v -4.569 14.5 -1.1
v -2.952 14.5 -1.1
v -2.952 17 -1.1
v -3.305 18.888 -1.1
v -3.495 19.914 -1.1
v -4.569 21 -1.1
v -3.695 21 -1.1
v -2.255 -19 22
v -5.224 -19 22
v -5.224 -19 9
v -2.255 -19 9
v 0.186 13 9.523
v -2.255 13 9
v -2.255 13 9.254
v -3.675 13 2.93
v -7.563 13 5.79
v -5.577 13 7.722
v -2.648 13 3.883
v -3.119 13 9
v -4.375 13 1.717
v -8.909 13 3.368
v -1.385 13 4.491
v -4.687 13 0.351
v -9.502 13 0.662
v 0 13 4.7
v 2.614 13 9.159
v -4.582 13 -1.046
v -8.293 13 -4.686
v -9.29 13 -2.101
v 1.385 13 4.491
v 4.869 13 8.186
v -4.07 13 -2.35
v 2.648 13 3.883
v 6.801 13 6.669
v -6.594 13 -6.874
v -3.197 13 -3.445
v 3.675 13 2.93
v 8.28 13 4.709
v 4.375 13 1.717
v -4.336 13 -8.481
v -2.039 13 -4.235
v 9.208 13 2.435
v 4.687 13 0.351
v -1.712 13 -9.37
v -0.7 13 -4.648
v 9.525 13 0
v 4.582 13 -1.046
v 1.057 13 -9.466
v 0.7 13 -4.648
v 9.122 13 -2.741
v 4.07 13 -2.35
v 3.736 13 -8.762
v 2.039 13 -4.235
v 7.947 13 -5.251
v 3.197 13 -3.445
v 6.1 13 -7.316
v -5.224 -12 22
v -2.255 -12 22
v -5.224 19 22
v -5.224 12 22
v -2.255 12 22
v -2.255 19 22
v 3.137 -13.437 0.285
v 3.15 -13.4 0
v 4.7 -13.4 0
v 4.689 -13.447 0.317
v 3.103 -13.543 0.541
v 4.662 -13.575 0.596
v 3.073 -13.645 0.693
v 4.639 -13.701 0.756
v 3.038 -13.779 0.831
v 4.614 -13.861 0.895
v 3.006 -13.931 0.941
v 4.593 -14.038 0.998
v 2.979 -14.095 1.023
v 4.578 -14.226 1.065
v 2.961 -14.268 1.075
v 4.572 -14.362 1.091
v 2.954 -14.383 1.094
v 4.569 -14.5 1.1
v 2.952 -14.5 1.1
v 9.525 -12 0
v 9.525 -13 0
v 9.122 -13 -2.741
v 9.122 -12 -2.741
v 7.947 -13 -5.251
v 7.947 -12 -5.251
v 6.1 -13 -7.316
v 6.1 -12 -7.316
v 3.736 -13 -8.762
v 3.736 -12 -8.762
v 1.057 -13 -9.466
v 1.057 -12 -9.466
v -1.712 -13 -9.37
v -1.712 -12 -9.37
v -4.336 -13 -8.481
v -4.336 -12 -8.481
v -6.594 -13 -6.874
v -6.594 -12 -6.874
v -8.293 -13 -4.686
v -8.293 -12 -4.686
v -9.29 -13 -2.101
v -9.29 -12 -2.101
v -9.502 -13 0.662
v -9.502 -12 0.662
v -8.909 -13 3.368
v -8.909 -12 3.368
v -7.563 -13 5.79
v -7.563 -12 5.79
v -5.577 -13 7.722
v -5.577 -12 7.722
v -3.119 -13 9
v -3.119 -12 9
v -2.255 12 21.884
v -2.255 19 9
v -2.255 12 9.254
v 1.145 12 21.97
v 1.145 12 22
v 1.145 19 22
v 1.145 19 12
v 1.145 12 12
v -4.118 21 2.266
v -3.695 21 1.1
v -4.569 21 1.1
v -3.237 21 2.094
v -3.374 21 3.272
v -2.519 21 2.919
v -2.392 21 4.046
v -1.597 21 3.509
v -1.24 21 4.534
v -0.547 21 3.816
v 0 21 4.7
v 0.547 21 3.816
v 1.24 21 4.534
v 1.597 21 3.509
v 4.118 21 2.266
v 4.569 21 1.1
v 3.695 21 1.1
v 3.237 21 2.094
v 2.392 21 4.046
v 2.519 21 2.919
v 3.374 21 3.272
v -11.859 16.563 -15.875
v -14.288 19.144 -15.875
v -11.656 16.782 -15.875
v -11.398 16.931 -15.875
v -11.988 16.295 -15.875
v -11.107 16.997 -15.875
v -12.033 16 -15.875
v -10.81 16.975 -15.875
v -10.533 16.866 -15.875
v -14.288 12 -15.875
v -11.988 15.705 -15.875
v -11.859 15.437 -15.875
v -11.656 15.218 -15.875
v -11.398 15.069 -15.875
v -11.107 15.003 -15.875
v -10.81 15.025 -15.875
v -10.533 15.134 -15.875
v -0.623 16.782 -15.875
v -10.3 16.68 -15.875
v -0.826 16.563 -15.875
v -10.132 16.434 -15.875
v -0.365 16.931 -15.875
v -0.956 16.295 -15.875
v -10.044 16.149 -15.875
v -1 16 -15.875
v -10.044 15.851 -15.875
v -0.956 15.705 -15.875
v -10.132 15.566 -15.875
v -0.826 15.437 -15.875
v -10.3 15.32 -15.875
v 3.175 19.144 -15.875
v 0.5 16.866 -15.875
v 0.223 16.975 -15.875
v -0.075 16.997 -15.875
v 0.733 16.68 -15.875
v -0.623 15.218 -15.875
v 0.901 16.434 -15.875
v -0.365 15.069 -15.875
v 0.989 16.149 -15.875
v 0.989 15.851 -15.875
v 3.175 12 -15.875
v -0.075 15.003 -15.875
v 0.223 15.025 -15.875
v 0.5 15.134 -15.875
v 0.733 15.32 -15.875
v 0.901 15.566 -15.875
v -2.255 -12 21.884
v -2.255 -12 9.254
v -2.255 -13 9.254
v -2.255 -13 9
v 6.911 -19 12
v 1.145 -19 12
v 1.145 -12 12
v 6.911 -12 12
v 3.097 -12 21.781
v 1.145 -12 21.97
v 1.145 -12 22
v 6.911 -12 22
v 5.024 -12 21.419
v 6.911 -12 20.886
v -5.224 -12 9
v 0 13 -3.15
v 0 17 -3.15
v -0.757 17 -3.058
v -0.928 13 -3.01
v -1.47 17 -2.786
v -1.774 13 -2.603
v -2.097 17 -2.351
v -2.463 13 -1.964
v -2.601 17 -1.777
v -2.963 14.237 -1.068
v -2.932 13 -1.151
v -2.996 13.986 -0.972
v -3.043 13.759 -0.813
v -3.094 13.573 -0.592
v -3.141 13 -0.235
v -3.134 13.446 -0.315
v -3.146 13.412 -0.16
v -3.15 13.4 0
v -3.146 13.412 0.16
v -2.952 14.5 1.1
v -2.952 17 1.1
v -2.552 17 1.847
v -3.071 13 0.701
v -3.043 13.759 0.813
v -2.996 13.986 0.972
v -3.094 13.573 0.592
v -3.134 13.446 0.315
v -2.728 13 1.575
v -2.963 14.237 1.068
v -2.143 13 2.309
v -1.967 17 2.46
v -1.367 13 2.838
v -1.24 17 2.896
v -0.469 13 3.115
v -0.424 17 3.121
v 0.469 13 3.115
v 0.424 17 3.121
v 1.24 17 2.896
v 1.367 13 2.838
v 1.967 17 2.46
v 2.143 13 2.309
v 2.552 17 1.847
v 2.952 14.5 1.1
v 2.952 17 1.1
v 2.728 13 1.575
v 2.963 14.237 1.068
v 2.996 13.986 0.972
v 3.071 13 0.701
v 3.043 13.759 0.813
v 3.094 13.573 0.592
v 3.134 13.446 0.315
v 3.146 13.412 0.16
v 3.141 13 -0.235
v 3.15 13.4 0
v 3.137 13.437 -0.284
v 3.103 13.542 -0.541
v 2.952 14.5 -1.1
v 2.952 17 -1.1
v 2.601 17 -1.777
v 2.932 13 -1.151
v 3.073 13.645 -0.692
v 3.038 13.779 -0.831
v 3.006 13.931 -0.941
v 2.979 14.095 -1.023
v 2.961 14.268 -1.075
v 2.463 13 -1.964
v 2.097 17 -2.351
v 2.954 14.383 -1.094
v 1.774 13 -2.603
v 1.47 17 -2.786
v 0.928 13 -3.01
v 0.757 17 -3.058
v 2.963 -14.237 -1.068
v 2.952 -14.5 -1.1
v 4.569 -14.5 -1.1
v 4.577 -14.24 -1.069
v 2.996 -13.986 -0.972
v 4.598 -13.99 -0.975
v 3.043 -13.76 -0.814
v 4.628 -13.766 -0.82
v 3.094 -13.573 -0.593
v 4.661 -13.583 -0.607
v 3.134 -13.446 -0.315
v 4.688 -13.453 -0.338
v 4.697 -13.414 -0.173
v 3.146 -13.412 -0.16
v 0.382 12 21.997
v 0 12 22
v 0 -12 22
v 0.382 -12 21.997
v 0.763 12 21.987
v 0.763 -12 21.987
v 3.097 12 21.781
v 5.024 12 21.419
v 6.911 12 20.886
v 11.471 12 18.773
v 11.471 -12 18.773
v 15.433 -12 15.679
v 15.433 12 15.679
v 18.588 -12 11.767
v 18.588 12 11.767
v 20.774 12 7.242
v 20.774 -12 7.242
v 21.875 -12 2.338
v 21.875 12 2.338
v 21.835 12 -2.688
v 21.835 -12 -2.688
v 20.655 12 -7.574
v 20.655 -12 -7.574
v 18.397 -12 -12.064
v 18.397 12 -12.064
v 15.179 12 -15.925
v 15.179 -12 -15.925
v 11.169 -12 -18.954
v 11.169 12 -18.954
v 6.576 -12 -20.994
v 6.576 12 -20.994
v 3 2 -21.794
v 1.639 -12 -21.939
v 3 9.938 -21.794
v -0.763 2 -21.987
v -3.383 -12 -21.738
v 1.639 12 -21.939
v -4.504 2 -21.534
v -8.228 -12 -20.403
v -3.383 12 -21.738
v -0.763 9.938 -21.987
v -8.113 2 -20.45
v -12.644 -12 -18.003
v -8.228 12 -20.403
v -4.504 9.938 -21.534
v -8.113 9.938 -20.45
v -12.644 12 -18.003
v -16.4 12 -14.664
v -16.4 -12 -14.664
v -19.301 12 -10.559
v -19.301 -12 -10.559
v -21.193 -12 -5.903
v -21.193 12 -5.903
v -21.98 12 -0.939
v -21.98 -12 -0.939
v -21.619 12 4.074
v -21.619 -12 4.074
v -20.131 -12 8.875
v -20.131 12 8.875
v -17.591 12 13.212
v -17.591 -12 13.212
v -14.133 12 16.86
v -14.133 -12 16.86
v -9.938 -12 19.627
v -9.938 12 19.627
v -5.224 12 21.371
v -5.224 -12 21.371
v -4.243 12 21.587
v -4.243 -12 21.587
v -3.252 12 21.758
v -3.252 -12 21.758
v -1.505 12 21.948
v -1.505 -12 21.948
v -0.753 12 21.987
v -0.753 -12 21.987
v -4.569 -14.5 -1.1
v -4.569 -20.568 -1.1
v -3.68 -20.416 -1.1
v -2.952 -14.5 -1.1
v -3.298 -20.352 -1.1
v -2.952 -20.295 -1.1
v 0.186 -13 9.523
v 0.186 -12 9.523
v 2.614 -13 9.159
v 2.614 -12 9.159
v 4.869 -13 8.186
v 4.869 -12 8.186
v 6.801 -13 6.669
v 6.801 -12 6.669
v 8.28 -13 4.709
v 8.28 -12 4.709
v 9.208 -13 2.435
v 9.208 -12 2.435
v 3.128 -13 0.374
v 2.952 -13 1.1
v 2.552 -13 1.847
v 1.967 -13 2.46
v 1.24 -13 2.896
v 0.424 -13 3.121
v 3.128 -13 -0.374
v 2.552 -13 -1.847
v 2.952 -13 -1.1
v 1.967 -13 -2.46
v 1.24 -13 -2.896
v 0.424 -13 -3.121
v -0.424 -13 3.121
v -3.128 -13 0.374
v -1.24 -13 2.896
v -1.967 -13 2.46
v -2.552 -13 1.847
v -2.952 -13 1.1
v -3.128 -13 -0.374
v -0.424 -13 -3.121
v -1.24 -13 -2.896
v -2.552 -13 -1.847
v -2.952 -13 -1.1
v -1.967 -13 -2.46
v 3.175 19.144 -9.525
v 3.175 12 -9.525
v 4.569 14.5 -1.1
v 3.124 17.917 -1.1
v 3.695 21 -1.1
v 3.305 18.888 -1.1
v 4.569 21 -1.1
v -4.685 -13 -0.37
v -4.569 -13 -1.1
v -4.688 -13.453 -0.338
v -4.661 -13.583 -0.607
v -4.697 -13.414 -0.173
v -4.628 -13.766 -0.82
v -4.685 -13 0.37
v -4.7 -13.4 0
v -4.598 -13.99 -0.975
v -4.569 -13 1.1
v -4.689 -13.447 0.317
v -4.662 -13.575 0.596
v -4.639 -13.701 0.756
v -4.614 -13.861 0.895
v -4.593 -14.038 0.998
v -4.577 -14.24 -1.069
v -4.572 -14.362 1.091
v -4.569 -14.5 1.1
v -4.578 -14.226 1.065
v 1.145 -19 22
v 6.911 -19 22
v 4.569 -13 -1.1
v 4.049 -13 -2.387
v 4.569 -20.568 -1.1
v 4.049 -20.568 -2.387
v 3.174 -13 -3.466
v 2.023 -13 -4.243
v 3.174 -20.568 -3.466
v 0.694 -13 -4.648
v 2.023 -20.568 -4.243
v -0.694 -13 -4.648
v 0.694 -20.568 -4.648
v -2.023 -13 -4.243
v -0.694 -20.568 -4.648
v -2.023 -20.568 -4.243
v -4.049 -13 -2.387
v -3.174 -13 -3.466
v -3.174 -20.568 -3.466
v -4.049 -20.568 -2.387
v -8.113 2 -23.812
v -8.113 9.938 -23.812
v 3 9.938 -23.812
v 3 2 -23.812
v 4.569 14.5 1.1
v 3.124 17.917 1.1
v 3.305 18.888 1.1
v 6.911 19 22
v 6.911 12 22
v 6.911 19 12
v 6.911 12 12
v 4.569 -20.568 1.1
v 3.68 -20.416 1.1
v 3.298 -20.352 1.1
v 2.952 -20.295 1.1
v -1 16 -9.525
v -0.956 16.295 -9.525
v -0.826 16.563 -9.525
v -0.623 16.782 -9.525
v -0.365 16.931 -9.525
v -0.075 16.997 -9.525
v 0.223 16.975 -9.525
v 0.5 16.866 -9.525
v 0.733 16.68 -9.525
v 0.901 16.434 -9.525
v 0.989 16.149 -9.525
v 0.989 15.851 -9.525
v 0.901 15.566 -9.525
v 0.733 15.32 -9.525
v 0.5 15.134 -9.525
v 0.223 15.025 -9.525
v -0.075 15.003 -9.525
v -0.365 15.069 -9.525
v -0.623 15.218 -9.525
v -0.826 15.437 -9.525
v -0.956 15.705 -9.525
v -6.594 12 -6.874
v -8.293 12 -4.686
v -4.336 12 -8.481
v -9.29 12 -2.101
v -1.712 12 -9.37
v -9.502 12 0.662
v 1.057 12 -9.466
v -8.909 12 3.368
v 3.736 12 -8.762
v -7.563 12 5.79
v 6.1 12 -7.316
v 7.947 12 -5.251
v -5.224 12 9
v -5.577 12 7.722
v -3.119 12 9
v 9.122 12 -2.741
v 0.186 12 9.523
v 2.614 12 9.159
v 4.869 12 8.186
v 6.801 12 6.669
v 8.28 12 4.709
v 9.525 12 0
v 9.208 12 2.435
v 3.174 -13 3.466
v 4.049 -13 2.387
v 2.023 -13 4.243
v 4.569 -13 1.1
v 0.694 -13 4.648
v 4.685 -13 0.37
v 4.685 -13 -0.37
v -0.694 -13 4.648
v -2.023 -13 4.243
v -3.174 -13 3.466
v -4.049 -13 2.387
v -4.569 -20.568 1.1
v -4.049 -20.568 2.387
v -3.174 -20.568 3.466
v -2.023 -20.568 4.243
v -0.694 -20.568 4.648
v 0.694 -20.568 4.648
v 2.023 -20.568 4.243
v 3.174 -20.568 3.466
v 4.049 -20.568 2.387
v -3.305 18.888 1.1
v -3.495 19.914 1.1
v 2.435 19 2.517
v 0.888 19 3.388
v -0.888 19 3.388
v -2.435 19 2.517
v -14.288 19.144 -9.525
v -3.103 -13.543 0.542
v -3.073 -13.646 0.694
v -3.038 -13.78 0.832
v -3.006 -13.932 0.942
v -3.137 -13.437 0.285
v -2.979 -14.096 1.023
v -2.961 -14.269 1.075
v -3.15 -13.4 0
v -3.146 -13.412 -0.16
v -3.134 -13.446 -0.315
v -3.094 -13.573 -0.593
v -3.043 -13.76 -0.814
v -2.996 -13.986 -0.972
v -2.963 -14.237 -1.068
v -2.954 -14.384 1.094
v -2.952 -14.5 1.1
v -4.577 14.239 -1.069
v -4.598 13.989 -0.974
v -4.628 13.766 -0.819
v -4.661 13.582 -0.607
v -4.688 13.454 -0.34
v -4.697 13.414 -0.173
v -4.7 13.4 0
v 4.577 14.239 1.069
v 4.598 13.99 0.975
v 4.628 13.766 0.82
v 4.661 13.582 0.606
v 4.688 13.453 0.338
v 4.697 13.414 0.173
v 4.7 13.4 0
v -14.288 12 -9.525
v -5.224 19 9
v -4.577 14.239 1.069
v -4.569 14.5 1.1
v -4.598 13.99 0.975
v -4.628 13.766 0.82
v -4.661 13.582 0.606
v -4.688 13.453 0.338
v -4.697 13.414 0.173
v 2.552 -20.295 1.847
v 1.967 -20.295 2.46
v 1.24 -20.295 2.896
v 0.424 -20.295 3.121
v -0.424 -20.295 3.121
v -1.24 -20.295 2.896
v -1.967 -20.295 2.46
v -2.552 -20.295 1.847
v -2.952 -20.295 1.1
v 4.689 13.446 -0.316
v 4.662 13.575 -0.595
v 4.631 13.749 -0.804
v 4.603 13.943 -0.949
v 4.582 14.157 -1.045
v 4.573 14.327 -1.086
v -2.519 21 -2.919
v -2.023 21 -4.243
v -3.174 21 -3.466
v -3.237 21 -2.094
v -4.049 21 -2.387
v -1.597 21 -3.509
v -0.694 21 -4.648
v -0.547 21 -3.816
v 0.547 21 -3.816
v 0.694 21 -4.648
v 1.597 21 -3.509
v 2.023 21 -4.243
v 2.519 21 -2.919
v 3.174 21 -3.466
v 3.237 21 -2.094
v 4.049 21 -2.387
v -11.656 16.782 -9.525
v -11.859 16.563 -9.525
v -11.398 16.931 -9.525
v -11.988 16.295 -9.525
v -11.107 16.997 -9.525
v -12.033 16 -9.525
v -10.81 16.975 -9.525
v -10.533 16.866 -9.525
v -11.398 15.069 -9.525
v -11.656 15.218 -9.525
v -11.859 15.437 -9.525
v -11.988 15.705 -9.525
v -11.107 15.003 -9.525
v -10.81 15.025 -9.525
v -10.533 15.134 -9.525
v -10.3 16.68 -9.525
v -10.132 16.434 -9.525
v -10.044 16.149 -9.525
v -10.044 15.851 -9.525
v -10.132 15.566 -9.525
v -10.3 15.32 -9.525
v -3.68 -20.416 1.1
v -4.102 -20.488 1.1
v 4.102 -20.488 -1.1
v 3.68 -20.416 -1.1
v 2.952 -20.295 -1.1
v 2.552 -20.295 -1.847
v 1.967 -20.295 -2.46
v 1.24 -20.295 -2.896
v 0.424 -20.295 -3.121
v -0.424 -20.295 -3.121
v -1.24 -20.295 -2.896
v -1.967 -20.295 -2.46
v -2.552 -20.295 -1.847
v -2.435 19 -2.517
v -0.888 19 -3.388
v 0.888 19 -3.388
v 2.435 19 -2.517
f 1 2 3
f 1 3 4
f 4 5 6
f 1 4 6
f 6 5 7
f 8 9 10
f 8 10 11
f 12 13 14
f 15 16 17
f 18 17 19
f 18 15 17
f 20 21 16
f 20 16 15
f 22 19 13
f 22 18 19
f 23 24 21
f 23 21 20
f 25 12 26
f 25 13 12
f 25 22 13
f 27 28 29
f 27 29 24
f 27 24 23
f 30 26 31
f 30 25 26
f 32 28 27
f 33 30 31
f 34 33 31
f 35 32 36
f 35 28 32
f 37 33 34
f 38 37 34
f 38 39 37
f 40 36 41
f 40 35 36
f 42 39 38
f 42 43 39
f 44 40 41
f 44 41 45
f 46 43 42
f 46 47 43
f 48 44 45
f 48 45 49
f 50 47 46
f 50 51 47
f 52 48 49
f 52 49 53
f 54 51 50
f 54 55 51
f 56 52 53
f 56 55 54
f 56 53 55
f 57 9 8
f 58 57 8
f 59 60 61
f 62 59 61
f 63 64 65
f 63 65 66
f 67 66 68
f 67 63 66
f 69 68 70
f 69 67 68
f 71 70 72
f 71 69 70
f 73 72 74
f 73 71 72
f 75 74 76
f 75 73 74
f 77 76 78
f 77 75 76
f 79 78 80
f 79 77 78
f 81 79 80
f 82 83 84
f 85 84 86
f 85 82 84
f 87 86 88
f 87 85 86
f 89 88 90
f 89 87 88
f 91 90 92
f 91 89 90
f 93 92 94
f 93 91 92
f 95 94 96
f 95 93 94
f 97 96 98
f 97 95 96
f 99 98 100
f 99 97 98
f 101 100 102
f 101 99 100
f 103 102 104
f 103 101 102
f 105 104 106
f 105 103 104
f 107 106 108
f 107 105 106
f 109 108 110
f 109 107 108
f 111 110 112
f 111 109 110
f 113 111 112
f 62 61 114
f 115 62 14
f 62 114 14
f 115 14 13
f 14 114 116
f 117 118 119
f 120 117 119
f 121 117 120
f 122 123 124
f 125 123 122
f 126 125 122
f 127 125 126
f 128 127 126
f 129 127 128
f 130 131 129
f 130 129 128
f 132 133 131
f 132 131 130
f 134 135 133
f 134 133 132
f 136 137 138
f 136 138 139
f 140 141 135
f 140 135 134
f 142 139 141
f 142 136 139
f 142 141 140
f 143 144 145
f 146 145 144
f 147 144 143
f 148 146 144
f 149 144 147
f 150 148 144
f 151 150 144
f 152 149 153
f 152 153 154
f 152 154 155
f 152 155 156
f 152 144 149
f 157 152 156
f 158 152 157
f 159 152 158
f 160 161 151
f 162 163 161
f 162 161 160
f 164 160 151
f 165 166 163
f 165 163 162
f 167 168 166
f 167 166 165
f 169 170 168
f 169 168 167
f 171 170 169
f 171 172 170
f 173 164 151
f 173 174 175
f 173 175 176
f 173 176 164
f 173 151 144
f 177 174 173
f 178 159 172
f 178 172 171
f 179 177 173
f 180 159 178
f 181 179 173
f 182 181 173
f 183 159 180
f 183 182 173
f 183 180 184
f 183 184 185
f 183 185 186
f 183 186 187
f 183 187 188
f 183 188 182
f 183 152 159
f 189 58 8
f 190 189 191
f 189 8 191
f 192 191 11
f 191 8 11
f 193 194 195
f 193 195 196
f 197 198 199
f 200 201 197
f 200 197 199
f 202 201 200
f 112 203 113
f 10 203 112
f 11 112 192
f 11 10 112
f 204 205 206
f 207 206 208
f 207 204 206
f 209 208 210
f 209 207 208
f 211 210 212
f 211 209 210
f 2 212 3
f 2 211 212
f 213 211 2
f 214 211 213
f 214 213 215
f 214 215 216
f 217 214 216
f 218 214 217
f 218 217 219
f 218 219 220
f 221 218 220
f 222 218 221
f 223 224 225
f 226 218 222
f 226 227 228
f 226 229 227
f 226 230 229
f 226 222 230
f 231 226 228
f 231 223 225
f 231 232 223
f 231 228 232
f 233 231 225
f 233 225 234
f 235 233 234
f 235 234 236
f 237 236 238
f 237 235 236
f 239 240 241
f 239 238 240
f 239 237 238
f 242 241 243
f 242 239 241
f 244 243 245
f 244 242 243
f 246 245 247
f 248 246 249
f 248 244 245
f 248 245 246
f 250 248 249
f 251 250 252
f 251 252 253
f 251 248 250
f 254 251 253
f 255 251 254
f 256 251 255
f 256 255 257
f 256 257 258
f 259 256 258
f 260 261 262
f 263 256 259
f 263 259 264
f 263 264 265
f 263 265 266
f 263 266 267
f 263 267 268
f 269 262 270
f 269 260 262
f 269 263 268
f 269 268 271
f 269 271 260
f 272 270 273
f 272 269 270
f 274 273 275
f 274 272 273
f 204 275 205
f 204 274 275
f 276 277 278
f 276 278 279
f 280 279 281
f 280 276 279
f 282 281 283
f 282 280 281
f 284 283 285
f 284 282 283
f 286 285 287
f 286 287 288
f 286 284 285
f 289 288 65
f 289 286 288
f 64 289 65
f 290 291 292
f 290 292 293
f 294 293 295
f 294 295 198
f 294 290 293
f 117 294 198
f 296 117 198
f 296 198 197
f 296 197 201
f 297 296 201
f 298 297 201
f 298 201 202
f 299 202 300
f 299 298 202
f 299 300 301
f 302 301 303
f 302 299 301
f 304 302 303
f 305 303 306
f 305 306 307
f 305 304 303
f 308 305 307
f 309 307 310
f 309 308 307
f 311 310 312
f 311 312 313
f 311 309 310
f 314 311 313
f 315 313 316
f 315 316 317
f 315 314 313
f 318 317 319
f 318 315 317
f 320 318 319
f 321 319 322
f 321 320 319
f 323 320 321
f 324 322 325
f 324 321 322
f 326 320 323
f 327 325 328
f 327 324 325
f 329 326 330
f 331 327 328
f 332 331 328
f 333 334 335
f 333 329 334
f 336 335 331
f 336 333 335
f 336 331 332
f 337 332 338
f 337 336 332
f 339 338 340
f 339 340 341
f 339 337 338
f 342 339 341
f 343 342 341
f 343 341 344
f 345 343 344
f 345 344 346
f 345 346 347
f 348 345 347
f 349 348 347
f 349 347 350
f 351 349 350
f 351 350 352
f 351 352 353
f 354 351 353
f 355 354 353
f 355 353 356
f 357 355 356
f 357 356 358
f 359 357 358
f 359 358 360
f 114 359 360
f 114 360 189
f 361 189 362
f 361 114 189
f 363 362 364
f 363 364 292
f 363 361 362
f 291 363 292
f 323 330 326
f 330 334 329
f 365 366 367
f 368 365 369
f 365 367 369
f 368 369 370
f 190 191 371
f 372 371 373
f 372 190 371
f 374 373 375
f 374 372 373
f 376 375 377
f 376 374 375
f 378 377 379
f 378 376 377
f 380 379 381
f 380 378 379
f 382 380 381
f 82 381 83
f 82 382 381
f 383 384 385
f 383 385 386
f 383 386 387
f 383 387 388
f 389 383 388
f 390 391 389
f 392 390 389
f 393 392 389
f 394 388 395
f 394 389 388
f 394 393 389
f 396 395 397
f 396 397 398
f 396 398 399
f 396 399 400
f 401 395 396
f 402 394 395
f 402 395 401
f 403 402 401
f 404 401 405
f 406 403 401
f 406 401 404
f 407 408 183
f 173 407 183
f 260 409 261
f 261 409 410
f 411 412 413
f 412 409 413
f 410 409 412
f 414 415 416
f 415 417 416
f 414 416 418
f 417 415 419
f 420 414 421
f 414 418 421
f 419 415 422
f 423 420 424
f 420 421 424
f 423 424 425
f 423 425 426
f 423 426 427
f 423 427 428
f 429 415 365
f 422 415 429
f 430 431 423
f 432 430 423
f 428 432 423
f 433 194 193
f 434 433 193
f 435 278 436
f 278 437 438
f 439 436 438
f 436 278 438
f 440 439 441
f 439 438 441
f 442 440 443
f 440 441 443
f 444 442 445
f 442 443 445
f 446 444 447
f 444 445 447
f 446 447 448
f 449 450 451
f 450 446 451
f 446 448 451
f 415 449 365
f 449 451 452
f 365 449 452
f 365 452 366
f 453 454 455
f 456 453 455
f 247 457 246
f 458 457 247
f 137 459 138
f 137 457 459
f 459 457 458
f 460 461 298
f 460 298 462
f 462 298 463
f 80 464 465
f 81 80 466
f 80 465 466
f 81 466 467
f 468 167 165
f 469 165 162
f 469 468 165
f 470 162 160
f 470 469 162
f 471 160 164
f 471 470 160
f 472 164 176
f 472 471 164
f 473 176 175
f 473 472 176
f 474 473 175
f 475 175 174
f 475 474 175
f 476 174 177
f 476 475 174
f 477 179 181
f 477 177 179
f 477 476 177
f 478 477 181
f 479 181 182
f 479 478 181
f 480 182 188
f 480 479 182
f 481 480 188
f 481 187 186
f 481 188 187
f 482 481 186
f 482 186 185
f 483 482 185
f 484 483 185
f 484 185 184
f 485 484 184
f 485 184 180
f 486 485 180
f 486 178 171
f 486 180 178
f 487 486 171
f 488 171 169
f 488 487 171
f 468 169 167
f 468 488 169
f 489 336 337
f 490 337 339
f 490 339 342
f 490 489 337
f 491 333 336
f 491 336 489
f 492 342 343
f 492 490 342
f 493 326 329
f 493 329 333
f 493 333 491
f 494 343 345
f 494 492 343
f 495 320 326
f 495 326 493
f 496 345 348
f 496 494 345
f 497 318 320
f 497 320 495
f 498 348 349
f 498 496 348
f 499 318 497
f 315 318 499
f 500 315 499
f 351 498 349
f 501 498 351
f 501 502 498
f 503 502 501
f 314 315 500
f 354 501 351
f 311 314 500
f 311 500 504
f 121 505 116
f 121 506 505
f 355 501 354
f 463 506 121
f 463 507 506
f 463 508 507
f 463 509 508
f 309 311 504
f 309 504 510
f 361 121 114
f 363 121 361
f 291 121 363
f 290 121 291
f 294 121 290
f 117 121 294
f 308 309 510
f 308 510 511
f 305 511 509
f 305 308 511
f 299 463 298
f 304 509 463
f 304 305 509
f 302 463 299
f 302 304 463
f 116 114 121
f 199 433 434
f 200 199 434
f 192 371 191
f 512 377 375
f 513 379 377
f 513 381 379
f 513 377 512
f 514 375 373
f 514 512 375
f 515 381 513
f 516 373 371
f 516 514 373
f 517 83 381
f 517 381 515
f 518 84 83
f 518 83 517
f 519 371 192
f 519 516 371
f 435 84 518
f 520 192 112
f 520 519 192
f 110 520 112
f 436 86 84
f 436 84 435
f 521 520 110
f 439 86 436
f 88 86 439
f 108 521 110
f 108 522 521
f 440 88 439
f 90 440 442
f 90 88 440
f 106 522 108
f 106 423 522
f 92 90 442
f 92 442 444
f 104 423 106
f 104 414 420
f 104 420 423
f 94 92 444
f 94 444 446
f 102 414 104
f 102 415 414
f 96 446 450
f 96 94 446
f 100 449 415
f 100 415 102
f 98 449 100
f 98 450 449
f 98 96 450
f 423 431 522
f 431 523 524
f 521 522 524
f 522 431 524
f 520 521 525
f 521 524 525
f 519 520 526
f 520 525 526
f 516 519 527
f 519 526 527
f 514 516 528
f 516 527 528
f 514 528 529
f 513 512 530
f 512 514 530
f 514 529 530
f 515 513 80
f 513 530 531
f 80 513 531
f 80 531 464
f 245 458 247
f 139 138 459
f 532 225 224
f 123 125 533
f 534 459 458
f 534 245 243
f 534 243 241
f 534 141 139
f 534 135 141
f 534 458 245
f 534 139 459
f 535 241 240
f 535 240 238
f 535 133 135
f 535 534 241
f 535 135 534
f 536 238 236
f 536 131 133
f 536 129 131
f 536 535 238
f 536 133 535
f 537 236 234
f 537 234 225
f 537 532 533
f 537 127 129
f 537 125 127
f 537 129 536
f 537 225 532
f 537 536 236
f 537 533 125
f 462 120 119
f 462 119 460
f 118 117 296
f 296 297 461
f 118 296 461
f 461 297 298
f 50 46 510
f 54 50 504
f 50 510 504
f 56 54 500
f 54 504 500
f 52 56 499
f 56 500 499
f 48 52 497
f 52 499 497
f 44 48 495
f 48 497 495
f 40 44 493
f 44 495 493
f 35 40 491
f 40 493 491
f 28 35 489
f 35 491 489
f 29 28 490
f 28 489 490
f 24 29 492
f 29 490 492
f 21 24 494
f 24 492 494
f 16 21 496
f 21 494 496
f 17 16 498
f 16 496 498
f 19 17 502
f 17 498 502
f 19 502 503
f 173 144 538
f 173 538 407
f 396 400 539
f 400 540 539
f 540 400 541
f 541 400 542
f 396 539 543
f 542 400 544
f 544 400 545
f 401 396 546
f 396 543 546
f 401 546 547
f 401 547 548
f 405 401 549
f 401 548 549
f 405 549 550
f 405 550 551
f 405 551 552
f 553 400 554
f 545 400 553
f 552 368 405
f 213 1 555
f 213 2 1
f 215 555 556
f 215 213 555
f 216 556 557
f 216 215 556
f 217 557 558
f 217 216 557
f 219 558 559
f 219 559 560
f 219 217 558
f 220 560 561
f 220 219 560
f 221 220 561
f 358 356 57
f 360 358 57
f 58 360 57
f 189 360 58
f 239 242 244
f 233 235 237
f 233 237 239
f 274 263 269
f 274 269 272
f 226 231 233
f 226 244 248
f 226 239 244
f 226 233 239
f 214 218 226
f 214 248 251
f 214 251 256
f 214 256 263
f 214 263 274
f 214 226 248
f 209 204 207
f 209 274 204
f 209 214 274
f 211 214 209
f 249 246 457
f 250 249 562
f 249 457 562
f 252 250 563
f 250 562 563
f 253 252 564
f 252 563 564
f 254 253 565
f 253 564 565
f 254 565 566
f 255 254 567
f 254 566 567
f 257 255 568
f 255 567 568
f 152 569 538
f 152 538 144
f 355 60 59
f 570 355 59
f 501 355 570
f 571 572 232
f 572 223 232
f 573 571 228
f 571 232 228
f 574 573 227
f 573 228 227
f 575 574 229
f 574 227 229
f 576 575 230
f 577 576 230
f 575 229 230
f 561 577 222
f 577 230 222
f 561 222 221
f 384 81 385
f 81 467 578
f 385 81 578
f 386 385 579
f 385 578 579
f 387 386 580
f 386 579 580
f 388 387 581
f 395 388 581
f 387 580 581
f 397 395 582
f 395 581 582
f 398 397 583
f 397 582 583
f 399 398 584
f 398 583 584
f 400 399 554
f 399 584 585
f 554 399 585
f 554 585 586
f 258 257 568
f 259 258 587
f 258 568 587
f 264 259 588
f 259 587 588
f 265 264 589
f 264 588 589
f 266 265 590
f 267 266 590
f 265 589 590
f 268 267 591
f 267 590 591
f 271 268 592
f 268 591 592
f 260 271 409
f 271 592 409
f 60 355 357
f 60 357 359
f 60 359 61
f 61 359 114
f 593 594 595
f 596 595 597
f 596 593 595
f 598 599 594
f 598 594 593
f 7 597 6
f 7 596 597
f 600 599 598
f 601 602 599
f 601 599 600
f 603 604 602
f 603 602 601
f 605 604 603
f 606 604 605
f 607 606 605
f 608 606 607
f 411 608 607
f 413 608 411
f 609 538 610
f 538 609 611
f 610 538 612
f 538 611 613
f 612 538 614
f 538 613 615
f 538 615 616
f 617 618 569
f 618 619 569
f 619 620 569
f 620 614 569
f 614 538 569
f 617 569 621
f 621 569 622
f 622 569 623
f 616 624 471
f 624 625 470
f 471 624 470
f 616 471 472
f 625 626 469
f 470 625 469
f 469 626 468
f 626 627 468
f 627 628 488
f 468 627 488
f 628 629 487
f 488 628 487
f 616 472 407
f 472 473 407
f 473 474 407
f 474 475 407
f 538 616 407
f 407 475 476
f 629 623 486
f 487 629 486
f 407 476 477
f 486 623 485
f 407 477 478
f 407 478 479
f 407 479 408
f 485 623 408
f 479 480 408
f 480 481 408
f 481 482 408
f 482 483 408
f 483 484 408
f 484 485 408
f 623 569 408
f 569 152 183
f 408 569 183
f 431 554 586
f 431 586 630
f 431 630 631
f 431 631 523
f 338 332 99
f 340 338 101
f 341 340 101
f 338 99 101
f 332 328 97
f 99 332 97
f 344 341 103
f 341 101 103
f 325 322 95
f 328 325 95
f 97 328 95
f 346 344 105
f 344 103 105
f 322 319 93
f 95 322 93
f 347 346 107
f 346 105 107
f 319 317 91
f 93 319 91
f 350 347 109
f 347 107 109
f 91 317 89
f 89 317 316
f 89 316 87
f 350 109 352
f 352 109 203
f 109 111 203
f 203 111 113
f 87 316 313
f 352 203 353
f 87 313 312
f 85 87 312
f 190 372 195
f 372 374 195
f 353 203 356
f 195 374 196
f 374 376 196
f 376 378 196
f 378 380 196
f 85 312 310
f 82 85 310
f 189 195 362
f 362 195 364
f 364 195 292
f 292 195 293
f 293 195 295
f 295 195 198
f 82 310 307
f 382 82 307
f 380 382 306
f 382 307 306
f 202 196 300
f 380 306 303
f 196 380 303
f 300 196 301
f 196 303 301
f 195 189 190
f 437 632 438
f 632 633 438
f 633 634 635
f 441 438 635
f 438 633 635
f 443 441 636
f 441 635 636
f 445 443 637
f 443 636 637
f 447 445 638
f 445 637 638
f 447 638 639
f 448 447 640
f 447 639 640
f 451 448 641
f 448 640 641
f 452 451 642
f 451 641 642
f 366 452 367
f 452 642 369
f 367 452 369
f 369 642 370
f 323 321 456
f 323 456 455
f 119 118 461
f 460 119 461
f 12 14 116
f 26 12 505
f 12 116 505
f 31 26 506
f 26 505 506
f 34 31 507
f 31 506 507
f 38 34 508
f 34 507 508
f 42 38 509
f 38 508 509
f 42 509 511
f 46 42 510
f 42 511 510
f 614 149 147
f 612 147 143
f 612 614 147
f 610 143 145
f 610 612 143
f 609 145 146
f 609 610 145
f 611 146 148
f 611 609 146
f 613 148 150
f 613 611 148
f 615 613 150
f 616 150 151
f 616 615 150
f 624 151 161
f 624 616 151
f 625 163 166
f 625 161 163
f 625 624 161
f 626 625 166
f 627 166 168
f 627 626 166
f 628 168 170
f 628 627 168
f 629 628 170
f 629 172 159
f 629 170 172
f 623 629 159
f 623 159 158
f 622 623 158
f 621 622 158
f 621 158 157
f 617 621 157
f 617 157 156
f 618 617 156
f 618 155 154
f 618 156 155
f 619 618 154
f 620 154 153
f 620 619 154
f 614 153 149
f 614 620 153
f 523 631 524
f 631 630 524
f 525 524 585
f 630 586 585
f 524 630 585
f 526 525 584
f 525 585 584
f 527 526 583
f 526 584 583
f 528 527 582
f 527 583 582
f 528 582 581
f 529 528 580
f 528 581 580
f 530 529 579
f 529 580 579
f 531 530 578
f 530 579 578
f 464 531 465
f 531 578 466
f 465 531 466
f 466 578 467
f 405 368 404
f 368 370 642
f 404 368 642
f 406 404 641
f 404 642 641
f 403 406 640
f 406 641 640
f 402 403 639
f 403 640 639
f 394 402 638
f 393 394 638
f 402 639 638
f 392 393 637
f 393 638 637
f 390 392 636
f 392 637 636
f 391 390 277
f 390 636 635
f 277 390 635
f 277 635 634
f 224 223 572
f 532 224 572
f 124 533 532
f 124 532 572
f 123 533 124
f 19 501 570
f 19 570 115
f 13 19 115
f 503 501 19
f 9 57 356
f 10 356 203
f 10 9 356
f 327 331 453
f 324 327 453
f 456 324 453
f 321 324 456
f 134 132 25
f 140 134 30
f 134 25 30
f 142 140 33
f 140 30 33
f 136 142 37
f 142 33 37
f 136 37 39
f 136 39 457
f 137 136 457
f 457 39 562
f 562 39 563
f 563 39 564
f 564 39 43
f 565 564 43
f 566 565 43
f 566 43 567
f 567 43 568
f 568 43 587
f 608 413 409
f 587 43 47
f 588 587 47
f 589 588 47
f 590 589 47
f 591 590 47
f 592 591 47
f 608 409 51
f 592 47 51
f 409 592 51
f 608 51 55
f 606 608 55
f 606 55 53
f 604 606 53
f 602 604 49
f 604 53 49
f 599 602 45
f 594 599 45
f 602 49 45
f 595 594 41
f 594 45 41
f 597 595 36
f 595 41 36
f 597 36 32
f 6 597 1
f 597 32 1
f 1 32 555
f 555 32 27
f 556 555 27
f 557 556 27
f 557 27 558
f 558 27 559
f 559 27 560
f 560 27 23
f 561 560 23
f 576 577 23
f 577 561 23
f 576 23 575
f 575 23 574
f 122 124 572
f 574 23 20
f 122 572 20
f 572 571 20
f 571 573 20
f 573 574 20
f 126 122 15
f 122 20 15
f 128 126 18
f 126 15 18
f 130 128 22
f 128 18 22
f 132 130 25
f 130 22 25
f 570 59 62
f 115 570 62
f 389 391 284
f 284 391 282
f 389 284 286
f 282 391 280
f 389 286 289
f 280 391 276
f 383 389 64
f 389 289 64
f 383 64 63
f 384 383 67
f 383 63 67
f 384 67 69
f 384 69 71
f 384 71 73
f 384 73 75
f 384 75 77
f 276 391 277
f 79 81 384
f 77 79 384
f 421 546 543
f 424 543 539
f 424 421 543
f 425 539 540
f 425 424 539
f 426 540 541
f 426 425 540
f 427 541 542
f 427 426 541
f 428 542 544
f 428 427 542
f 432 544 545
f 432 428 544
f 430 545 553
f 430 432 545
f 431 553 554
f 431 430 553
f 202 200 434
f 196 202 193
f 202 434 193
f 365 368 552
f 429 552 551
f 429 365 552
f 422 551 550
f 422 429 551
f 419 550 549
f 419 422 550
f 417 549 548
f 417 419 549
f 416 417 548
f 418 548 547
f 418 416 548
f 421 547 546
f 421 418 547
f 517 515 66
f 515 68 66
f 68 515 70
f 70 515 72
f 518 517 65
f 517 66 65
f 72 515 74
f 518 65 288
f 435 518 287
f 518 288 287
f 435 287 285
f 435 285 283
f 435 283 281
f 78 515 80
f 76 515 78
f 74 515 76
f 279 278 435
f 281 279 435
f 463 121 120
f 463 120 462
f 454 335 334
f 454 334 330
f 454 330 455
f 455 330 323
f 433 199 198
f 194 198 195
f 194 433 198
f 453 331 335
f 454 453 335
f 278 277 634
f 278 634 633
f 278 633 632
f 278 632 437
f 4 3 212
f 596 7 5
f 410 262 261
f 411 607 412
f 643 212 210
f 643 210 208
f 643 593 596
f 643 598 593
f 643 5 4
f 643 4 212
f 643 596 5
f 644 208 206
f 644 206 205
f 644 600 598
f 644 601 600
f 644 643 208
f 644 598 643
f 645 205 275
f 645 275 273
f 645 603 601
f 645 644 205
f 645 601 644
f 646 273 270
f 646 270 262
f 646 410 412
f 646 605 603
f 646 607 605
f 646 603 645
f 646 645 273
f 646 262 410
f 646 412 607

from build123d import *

# Parameters (mm, degrees)
SKETCH1_R               = 22
BOSS_EXTRUDE1_DEPTH     = 12
SKETCH2_W               = 2.968955178
SKETCH2_H               = 13
SKETCH2_W_2             = 5.766624481
SKETCH2_H_2             = 10
BOSS_EXTRUDE2_DEPTH     = 7
SKETCH3_R               = 4.7
BOSS_EXTRUDE3_DEPTH     = 9
SKETCH5_R               = 9.525
BOSS_EXTRUDE4_DEPTH     = 1
CUT_EXTRUDE1_START      = -8
SKETCH6_R               = 3.15
CUT_EXTRUDE1_DEPTH      = 54.354161882
CHAMFER1_SIZE           = 4
CHAMFER1_SIZE2          = 0.705307923
SKETCH7_W               = 2.2
SKETCH7_H               = 7.6
CUT_EXTRUDE2_DEPTH      = 38.536648758
FILLET1_R               = 1.1
SKETCH8_W               = 17.4625
SKETCH8_H               = 6.35
BOSS_EXTRUDE6_DEPTH     = 7.14375
SKETCH9_W               = 11.1125
SKETCH9_H               = 7.9375
BOSS_EXTRUDE7_DEPTH     = 23.8125
CUT_EXTRUDE3_DEPTH      = 49.574845643
CUT_EXTRUDE3_DEPTH_BACK = 6.35
SKETCH10_R              = 1
MIRROR6_OUTLINE_W       = 9.525
MIRROR6_OUTLINE_H       = 1
MIRROR6_START           = -19
MIRROR6_2_OUTLINE_W     = 2.968955178
MIRROR6_2_OUTLINE_H     = 13
MIRROR6_2_OUTLINE_W_2   = 5.766624481
MIRROR6_2_OUTLINE_H_2   = 10
MIRROR6_2_DEPTH         = 7
MIRROR6_START_2         = -20.567999245
MIRROR6_3_DEPTH         = 1.567999245
MIRROR6_START_3         = -14.5000001
MIRROR6_4_DEPTH         = 1.5000001
MIRROR6_START_4         = -6
MIRROR6_5_DEPTH         = 12


with BuildPart() as part:
    # Sketch1 → Boss-Extrude1 (new, symmetric)
    with BuildSketch(Plane(origin=(0, 0, 0), x_dir=(1, 0, 0), z_dir=(0, 1, 0))):
        with Locations(Location((0, 0, 0), (0, 0, 270))):
            Circle(SKETCH1_R)
    extrude(amount=BOSS_EXTRUDE1_DEPTH, both=True)

    # Sketch2 → Boss-Extrude2 (add)
    with BuildSketch(Plane(origin=(0, 12, 0), x_dir=(1, 0, 0), z_dir=(0, 1, 0))):
        with Locations((-3.739741619, -15.5)):
            Rectangle(SKETCH2_W, SKETCH2_H)
        with Locations((4.02804821, -17)):
            Rectangle(SKETCH2_W_2, SKETCH2_H_2)
    extrude(amount=BOSS_EXTRUDE2_DEPTH)

    # Sketch3 → Boss-Extrude3 (add)
    with BuildSketch(Plane(origin=(0, 12, 0), x_dir=(1, 0, 0), z_dir=(0, 1, 0))):
        with Locations(Location((0, 0, 0), (0, 0, 270))):
            Circle(SKETCH3_R)
    extrude(amount=BOSS_EXTRUDE3_DEPTH)

    # Sketch5 → Boss-Extrude4 (add)
    with BuildSketch(Plane(origin=(0, 12, 0), x_dir=(1, 0, 0), z_dir=(0, 1, 0))):
        Circle(SKETCH5_R)
    extrude(amount=BOSS_EXTRUDE4_DEPTH)

    # Sketch6 → Cut-Extrude1 (cut)
    with BuildSketch(Plane(origin=(0, 21, 0), x_dir=(1, 0, 0), z_dir=(0, 1, 0)).offset(CUT_EXTRUDE1_START)):
        with Locations(Location((0, 0, 0), (0, 0, 90))):
            Circle(SKETCH6_R)
    extrude(amount=CUT_EXTRUDE1_DEPTH, mode=Mode.SUBTRACT)

    # Chamfer1
    chamfer1_edges = [part.edges().sort_by_distance(p)[0] for p in [
        (0, 21, 3.15),
    ]]
    chamfer1_side = [part.faces().sort_by_distance(p)[0] for p in [
        (0, 17, 3.15),
    ]]
    chamfer(chamfer1_edges, length=CHAMFER1_SIZE, length2=CHAMFER1_SIZE2, reference=chamfer1_side[0])

    # Sketch7 → Cut-Extrude2 (cut, symmetric)
    with BuildSketch(Plane(origin=(0, 0, 0), x_dir=(0, 0, -1), z_dir=(1, 0, 0))):
        with Locations((0, 17.2)):
            Rectangle(SKETCH7_W, SKETCH7_H)
    extrude(amount=CUT_EXTRUDE2_DEPTH, both=True, mode=Mode.SUBTRACT)

    # Fillet1
    fillet1_edges = [part.edges().sort_by_distance(p)[0] for p in [
        (3.760579146, 13.4, -1.1),
        (-3.760579146, 13.4, -1.1),
        (3.760579146, 13.4, 1.1),
        (-3.760579146, 13.4, 1.1),
    ]]
    fillet(fillet1_edges, radius=FILLET1_R - 0.0001)  # a hair under: the kernel refuses the full size

    # Sketch9 → Boss-Extrude7 (add)
    with BuildSketch(Plane.XY):
        with Locations((-2.55625, 5.96875)):
            Rectangle(SKETCH9_W, SKETCH9_H)
    extrude(amount=-BOSS_EXTRUDE7_DEPTH)

    # Mirror6: read off the stored shape, not the designer's step
    # Mirror6 outline → Mirror6 (revolve)
    with BuildSketch(Plane.XY):
        with Locations((4.7625, -12.5)):
            Rectangle(MIRROR6_OUTLINE_W, MIRROR6_OUTLINE_H)
    revolve(axis=Axis((0, 0, 0), (0, 1, 0)))

    # Mirror6 2 outline → Mirror6 2 (add)
    with BuildSketch(Plane(origin=(0, 0, 0), x_dir=(1, 0, 0), z_dir=(0, 1, 0)).offset(MIRROR6_START)):
        with BuildLine():
            Line((2.951694429, 1.1), (4.569463864, 1.1))
            ThreePointArc((4.569463864, 1.1), (0, 4.7), (-4.569463864, 1.1))
            Line((-4.569463864, 1.1), (-2.951694429, 1.1))
            ThreePointArc((-2.951694429, 1.1), (0, 3.15), (2.951694429, 1.1))
        make_face()
        with BuildLine():
            ThreePointArc((-4.569463864, -1.1), (0, -4.7), (4.569463864, -1.1))
            Line((4.569463864, -1.1), (2.951694429, -1.1))
            ThreePointArc((2.951694429, -1.1), (0, -3.15), (-2.951694429, -1.1))
            Line((-2.951694429, -1.1), (-4.569463864, -1.1))
        make_face()
        with Locations((-3.739741619, -15.5)):
            Rectangle(MIRROR6_2_OUTLINE_W, MIRROR6_2_OUTLINE_H)
        with Locations((4.02804821, -17)):
            Rectangle(MIRROR6_2_OUTLINE_W_2, MIRROR6_2_OUTLINE_H_2)
    extrude(amount=MIRROR6_2_DEPTH)

    # Mirror6 3 outline → Mirror6 3 (add)
    with BuildSketch(Plane(origin=(0, 0, 0), x_dir=(1, 0, 0), z_dir=(0, 1, 0)).offset(MIRROR6_START_2)):
        with BuildLine():
            Line((2.951694429, 1.1), (4.569463864, 1.1))
            ThreePointArc((4.569463864, 1.1), (0, 4.7), (-4.569463864, 1.1))
            Line((-4.569463864, 1.1), (-2.951694429, 1.1))
            ThreePointArc((-2.951694429, 1.1), (0, 3.15), (2.951694429, 1.1))
        make_face()
        with BuildLine():
            ThreePointArc((-4.569463864, -1.1), (0, -4.7), (4.569463864, -1.1))
            Line((4.569463864, -1.1), (2.951694429, -1.1))
            ThreePointArc((2.951694429, -1.1), (0, -3.15), (-2.951694429, -1.1))
            Line((-2.951694429, -1.1), (-4.569463864, -1.1))
        make_face()
    extrude(amount=MIRROR6_3_DEPTH)

    # Mirror6 4 outline → Mirror6 4 (add)
    with BuildSketch(Plane(origin=(0, 0, 0), x_dir=(1, 0, 0), z_dir=(0, 1, 0)).offset(MIRROR6_START_3)):
        with BuildLine():
            ThreePointArc((4.569463864, -1.1), (4.7, 0), (4.569463864, 1.1))
            Line((4.569463864, 1.1), (2.951694429, 1.1))
            ThreePointArc((2.951694429, 1.1), (3.15, 0), (2.951694429, -1.1))
            Line((2.951694429, -1.1), (4.569463864, -1.1))
        make_face()
        with BuildLine():
            Line((-2.951694429, 1.1), (-4.569463864, 1.1))
            ThreePointArc((-4.569463864, 1.1), (-4.7, 0), (-4.569463864, -1.1))
            Line((-4.569463864, -1.1), (-2.951694429, -1.1))
            ThreePointArc((-2.951694429, -1.1), (-3.15, 0), (-2.951694429, 1.1))
        make_face()
    extrude(amount=MIRROR6_4_DEPTH)

    # Mirror6 5 outline → Mirror6 5 (cut)
    with BuildSketch(Plane.YZ.offset(MIRROR6_START_4)):
        with BuildLine():
            ThreePointArc((-13.4, 0), (-13.722182541, 0.777817459), (-14.5, 1.1))
            Line((-14.5, 1.1), (-14.5, -1.1))
            ThreePointArc((-14.5, -1.1), (-13.722182541, -0.777817459), (-13.4, 0))
        make_face()
    extrude(amount=MIRROR6_5_DEPTH, mode=Mode.SUBTRACT)

    # Mirror6 6 outline → Mirror6 6 (revolve, cut)
    with BuildSketch(Plane.XY):
        Polygon((4.700000002, -20.567998898), (3.14999999, -20.294692075), (3.15, -20.567999245), align=None)
    revolve(axis=Axis((0, 0, 0), (0, 1, 0)), mode=Mode.SUBTRACT)


with BuildPart() as body_2:
    # Sketch8 → Boss-Extrude6 (new body)
    with BuildSketch(Plane(origin=(0, 12, 0), x_dir=(1, 0, 0), z_dir=(0, 1, 0))):
        with Locations((-5.55625, 12.7)):
            Rectangle(SKETCH8_W, SKETCH8_H)
    extrude(amount=BOSS_EXTRUDE6_DEPTH)

    # Sketch10 → Cut-Extrude3 (cut, two sides: drawn at the far end of the back side and taken through both)
    with BuildSketch(Plane(origin=(0, 0, -15.875), x_dir=(-1, 0, 0), z_dir=(0, 0, -1)).offset(-CUT_EXTRUDE3_DEPTH_BACK)):
        with Locations((0, 16)):
            Circle(SKETCH10_R)
        with Locations((11.032684987, 16)):
            Circle(SKETCH10_R)
    extrude(amount=CUT_EXTRUDE3_DEPTH + CUT_EXTRUDE3_DEPTH_BACK, mode=Mode.SUBTRACT)


solid = Compound([part.part, body_2.part])
